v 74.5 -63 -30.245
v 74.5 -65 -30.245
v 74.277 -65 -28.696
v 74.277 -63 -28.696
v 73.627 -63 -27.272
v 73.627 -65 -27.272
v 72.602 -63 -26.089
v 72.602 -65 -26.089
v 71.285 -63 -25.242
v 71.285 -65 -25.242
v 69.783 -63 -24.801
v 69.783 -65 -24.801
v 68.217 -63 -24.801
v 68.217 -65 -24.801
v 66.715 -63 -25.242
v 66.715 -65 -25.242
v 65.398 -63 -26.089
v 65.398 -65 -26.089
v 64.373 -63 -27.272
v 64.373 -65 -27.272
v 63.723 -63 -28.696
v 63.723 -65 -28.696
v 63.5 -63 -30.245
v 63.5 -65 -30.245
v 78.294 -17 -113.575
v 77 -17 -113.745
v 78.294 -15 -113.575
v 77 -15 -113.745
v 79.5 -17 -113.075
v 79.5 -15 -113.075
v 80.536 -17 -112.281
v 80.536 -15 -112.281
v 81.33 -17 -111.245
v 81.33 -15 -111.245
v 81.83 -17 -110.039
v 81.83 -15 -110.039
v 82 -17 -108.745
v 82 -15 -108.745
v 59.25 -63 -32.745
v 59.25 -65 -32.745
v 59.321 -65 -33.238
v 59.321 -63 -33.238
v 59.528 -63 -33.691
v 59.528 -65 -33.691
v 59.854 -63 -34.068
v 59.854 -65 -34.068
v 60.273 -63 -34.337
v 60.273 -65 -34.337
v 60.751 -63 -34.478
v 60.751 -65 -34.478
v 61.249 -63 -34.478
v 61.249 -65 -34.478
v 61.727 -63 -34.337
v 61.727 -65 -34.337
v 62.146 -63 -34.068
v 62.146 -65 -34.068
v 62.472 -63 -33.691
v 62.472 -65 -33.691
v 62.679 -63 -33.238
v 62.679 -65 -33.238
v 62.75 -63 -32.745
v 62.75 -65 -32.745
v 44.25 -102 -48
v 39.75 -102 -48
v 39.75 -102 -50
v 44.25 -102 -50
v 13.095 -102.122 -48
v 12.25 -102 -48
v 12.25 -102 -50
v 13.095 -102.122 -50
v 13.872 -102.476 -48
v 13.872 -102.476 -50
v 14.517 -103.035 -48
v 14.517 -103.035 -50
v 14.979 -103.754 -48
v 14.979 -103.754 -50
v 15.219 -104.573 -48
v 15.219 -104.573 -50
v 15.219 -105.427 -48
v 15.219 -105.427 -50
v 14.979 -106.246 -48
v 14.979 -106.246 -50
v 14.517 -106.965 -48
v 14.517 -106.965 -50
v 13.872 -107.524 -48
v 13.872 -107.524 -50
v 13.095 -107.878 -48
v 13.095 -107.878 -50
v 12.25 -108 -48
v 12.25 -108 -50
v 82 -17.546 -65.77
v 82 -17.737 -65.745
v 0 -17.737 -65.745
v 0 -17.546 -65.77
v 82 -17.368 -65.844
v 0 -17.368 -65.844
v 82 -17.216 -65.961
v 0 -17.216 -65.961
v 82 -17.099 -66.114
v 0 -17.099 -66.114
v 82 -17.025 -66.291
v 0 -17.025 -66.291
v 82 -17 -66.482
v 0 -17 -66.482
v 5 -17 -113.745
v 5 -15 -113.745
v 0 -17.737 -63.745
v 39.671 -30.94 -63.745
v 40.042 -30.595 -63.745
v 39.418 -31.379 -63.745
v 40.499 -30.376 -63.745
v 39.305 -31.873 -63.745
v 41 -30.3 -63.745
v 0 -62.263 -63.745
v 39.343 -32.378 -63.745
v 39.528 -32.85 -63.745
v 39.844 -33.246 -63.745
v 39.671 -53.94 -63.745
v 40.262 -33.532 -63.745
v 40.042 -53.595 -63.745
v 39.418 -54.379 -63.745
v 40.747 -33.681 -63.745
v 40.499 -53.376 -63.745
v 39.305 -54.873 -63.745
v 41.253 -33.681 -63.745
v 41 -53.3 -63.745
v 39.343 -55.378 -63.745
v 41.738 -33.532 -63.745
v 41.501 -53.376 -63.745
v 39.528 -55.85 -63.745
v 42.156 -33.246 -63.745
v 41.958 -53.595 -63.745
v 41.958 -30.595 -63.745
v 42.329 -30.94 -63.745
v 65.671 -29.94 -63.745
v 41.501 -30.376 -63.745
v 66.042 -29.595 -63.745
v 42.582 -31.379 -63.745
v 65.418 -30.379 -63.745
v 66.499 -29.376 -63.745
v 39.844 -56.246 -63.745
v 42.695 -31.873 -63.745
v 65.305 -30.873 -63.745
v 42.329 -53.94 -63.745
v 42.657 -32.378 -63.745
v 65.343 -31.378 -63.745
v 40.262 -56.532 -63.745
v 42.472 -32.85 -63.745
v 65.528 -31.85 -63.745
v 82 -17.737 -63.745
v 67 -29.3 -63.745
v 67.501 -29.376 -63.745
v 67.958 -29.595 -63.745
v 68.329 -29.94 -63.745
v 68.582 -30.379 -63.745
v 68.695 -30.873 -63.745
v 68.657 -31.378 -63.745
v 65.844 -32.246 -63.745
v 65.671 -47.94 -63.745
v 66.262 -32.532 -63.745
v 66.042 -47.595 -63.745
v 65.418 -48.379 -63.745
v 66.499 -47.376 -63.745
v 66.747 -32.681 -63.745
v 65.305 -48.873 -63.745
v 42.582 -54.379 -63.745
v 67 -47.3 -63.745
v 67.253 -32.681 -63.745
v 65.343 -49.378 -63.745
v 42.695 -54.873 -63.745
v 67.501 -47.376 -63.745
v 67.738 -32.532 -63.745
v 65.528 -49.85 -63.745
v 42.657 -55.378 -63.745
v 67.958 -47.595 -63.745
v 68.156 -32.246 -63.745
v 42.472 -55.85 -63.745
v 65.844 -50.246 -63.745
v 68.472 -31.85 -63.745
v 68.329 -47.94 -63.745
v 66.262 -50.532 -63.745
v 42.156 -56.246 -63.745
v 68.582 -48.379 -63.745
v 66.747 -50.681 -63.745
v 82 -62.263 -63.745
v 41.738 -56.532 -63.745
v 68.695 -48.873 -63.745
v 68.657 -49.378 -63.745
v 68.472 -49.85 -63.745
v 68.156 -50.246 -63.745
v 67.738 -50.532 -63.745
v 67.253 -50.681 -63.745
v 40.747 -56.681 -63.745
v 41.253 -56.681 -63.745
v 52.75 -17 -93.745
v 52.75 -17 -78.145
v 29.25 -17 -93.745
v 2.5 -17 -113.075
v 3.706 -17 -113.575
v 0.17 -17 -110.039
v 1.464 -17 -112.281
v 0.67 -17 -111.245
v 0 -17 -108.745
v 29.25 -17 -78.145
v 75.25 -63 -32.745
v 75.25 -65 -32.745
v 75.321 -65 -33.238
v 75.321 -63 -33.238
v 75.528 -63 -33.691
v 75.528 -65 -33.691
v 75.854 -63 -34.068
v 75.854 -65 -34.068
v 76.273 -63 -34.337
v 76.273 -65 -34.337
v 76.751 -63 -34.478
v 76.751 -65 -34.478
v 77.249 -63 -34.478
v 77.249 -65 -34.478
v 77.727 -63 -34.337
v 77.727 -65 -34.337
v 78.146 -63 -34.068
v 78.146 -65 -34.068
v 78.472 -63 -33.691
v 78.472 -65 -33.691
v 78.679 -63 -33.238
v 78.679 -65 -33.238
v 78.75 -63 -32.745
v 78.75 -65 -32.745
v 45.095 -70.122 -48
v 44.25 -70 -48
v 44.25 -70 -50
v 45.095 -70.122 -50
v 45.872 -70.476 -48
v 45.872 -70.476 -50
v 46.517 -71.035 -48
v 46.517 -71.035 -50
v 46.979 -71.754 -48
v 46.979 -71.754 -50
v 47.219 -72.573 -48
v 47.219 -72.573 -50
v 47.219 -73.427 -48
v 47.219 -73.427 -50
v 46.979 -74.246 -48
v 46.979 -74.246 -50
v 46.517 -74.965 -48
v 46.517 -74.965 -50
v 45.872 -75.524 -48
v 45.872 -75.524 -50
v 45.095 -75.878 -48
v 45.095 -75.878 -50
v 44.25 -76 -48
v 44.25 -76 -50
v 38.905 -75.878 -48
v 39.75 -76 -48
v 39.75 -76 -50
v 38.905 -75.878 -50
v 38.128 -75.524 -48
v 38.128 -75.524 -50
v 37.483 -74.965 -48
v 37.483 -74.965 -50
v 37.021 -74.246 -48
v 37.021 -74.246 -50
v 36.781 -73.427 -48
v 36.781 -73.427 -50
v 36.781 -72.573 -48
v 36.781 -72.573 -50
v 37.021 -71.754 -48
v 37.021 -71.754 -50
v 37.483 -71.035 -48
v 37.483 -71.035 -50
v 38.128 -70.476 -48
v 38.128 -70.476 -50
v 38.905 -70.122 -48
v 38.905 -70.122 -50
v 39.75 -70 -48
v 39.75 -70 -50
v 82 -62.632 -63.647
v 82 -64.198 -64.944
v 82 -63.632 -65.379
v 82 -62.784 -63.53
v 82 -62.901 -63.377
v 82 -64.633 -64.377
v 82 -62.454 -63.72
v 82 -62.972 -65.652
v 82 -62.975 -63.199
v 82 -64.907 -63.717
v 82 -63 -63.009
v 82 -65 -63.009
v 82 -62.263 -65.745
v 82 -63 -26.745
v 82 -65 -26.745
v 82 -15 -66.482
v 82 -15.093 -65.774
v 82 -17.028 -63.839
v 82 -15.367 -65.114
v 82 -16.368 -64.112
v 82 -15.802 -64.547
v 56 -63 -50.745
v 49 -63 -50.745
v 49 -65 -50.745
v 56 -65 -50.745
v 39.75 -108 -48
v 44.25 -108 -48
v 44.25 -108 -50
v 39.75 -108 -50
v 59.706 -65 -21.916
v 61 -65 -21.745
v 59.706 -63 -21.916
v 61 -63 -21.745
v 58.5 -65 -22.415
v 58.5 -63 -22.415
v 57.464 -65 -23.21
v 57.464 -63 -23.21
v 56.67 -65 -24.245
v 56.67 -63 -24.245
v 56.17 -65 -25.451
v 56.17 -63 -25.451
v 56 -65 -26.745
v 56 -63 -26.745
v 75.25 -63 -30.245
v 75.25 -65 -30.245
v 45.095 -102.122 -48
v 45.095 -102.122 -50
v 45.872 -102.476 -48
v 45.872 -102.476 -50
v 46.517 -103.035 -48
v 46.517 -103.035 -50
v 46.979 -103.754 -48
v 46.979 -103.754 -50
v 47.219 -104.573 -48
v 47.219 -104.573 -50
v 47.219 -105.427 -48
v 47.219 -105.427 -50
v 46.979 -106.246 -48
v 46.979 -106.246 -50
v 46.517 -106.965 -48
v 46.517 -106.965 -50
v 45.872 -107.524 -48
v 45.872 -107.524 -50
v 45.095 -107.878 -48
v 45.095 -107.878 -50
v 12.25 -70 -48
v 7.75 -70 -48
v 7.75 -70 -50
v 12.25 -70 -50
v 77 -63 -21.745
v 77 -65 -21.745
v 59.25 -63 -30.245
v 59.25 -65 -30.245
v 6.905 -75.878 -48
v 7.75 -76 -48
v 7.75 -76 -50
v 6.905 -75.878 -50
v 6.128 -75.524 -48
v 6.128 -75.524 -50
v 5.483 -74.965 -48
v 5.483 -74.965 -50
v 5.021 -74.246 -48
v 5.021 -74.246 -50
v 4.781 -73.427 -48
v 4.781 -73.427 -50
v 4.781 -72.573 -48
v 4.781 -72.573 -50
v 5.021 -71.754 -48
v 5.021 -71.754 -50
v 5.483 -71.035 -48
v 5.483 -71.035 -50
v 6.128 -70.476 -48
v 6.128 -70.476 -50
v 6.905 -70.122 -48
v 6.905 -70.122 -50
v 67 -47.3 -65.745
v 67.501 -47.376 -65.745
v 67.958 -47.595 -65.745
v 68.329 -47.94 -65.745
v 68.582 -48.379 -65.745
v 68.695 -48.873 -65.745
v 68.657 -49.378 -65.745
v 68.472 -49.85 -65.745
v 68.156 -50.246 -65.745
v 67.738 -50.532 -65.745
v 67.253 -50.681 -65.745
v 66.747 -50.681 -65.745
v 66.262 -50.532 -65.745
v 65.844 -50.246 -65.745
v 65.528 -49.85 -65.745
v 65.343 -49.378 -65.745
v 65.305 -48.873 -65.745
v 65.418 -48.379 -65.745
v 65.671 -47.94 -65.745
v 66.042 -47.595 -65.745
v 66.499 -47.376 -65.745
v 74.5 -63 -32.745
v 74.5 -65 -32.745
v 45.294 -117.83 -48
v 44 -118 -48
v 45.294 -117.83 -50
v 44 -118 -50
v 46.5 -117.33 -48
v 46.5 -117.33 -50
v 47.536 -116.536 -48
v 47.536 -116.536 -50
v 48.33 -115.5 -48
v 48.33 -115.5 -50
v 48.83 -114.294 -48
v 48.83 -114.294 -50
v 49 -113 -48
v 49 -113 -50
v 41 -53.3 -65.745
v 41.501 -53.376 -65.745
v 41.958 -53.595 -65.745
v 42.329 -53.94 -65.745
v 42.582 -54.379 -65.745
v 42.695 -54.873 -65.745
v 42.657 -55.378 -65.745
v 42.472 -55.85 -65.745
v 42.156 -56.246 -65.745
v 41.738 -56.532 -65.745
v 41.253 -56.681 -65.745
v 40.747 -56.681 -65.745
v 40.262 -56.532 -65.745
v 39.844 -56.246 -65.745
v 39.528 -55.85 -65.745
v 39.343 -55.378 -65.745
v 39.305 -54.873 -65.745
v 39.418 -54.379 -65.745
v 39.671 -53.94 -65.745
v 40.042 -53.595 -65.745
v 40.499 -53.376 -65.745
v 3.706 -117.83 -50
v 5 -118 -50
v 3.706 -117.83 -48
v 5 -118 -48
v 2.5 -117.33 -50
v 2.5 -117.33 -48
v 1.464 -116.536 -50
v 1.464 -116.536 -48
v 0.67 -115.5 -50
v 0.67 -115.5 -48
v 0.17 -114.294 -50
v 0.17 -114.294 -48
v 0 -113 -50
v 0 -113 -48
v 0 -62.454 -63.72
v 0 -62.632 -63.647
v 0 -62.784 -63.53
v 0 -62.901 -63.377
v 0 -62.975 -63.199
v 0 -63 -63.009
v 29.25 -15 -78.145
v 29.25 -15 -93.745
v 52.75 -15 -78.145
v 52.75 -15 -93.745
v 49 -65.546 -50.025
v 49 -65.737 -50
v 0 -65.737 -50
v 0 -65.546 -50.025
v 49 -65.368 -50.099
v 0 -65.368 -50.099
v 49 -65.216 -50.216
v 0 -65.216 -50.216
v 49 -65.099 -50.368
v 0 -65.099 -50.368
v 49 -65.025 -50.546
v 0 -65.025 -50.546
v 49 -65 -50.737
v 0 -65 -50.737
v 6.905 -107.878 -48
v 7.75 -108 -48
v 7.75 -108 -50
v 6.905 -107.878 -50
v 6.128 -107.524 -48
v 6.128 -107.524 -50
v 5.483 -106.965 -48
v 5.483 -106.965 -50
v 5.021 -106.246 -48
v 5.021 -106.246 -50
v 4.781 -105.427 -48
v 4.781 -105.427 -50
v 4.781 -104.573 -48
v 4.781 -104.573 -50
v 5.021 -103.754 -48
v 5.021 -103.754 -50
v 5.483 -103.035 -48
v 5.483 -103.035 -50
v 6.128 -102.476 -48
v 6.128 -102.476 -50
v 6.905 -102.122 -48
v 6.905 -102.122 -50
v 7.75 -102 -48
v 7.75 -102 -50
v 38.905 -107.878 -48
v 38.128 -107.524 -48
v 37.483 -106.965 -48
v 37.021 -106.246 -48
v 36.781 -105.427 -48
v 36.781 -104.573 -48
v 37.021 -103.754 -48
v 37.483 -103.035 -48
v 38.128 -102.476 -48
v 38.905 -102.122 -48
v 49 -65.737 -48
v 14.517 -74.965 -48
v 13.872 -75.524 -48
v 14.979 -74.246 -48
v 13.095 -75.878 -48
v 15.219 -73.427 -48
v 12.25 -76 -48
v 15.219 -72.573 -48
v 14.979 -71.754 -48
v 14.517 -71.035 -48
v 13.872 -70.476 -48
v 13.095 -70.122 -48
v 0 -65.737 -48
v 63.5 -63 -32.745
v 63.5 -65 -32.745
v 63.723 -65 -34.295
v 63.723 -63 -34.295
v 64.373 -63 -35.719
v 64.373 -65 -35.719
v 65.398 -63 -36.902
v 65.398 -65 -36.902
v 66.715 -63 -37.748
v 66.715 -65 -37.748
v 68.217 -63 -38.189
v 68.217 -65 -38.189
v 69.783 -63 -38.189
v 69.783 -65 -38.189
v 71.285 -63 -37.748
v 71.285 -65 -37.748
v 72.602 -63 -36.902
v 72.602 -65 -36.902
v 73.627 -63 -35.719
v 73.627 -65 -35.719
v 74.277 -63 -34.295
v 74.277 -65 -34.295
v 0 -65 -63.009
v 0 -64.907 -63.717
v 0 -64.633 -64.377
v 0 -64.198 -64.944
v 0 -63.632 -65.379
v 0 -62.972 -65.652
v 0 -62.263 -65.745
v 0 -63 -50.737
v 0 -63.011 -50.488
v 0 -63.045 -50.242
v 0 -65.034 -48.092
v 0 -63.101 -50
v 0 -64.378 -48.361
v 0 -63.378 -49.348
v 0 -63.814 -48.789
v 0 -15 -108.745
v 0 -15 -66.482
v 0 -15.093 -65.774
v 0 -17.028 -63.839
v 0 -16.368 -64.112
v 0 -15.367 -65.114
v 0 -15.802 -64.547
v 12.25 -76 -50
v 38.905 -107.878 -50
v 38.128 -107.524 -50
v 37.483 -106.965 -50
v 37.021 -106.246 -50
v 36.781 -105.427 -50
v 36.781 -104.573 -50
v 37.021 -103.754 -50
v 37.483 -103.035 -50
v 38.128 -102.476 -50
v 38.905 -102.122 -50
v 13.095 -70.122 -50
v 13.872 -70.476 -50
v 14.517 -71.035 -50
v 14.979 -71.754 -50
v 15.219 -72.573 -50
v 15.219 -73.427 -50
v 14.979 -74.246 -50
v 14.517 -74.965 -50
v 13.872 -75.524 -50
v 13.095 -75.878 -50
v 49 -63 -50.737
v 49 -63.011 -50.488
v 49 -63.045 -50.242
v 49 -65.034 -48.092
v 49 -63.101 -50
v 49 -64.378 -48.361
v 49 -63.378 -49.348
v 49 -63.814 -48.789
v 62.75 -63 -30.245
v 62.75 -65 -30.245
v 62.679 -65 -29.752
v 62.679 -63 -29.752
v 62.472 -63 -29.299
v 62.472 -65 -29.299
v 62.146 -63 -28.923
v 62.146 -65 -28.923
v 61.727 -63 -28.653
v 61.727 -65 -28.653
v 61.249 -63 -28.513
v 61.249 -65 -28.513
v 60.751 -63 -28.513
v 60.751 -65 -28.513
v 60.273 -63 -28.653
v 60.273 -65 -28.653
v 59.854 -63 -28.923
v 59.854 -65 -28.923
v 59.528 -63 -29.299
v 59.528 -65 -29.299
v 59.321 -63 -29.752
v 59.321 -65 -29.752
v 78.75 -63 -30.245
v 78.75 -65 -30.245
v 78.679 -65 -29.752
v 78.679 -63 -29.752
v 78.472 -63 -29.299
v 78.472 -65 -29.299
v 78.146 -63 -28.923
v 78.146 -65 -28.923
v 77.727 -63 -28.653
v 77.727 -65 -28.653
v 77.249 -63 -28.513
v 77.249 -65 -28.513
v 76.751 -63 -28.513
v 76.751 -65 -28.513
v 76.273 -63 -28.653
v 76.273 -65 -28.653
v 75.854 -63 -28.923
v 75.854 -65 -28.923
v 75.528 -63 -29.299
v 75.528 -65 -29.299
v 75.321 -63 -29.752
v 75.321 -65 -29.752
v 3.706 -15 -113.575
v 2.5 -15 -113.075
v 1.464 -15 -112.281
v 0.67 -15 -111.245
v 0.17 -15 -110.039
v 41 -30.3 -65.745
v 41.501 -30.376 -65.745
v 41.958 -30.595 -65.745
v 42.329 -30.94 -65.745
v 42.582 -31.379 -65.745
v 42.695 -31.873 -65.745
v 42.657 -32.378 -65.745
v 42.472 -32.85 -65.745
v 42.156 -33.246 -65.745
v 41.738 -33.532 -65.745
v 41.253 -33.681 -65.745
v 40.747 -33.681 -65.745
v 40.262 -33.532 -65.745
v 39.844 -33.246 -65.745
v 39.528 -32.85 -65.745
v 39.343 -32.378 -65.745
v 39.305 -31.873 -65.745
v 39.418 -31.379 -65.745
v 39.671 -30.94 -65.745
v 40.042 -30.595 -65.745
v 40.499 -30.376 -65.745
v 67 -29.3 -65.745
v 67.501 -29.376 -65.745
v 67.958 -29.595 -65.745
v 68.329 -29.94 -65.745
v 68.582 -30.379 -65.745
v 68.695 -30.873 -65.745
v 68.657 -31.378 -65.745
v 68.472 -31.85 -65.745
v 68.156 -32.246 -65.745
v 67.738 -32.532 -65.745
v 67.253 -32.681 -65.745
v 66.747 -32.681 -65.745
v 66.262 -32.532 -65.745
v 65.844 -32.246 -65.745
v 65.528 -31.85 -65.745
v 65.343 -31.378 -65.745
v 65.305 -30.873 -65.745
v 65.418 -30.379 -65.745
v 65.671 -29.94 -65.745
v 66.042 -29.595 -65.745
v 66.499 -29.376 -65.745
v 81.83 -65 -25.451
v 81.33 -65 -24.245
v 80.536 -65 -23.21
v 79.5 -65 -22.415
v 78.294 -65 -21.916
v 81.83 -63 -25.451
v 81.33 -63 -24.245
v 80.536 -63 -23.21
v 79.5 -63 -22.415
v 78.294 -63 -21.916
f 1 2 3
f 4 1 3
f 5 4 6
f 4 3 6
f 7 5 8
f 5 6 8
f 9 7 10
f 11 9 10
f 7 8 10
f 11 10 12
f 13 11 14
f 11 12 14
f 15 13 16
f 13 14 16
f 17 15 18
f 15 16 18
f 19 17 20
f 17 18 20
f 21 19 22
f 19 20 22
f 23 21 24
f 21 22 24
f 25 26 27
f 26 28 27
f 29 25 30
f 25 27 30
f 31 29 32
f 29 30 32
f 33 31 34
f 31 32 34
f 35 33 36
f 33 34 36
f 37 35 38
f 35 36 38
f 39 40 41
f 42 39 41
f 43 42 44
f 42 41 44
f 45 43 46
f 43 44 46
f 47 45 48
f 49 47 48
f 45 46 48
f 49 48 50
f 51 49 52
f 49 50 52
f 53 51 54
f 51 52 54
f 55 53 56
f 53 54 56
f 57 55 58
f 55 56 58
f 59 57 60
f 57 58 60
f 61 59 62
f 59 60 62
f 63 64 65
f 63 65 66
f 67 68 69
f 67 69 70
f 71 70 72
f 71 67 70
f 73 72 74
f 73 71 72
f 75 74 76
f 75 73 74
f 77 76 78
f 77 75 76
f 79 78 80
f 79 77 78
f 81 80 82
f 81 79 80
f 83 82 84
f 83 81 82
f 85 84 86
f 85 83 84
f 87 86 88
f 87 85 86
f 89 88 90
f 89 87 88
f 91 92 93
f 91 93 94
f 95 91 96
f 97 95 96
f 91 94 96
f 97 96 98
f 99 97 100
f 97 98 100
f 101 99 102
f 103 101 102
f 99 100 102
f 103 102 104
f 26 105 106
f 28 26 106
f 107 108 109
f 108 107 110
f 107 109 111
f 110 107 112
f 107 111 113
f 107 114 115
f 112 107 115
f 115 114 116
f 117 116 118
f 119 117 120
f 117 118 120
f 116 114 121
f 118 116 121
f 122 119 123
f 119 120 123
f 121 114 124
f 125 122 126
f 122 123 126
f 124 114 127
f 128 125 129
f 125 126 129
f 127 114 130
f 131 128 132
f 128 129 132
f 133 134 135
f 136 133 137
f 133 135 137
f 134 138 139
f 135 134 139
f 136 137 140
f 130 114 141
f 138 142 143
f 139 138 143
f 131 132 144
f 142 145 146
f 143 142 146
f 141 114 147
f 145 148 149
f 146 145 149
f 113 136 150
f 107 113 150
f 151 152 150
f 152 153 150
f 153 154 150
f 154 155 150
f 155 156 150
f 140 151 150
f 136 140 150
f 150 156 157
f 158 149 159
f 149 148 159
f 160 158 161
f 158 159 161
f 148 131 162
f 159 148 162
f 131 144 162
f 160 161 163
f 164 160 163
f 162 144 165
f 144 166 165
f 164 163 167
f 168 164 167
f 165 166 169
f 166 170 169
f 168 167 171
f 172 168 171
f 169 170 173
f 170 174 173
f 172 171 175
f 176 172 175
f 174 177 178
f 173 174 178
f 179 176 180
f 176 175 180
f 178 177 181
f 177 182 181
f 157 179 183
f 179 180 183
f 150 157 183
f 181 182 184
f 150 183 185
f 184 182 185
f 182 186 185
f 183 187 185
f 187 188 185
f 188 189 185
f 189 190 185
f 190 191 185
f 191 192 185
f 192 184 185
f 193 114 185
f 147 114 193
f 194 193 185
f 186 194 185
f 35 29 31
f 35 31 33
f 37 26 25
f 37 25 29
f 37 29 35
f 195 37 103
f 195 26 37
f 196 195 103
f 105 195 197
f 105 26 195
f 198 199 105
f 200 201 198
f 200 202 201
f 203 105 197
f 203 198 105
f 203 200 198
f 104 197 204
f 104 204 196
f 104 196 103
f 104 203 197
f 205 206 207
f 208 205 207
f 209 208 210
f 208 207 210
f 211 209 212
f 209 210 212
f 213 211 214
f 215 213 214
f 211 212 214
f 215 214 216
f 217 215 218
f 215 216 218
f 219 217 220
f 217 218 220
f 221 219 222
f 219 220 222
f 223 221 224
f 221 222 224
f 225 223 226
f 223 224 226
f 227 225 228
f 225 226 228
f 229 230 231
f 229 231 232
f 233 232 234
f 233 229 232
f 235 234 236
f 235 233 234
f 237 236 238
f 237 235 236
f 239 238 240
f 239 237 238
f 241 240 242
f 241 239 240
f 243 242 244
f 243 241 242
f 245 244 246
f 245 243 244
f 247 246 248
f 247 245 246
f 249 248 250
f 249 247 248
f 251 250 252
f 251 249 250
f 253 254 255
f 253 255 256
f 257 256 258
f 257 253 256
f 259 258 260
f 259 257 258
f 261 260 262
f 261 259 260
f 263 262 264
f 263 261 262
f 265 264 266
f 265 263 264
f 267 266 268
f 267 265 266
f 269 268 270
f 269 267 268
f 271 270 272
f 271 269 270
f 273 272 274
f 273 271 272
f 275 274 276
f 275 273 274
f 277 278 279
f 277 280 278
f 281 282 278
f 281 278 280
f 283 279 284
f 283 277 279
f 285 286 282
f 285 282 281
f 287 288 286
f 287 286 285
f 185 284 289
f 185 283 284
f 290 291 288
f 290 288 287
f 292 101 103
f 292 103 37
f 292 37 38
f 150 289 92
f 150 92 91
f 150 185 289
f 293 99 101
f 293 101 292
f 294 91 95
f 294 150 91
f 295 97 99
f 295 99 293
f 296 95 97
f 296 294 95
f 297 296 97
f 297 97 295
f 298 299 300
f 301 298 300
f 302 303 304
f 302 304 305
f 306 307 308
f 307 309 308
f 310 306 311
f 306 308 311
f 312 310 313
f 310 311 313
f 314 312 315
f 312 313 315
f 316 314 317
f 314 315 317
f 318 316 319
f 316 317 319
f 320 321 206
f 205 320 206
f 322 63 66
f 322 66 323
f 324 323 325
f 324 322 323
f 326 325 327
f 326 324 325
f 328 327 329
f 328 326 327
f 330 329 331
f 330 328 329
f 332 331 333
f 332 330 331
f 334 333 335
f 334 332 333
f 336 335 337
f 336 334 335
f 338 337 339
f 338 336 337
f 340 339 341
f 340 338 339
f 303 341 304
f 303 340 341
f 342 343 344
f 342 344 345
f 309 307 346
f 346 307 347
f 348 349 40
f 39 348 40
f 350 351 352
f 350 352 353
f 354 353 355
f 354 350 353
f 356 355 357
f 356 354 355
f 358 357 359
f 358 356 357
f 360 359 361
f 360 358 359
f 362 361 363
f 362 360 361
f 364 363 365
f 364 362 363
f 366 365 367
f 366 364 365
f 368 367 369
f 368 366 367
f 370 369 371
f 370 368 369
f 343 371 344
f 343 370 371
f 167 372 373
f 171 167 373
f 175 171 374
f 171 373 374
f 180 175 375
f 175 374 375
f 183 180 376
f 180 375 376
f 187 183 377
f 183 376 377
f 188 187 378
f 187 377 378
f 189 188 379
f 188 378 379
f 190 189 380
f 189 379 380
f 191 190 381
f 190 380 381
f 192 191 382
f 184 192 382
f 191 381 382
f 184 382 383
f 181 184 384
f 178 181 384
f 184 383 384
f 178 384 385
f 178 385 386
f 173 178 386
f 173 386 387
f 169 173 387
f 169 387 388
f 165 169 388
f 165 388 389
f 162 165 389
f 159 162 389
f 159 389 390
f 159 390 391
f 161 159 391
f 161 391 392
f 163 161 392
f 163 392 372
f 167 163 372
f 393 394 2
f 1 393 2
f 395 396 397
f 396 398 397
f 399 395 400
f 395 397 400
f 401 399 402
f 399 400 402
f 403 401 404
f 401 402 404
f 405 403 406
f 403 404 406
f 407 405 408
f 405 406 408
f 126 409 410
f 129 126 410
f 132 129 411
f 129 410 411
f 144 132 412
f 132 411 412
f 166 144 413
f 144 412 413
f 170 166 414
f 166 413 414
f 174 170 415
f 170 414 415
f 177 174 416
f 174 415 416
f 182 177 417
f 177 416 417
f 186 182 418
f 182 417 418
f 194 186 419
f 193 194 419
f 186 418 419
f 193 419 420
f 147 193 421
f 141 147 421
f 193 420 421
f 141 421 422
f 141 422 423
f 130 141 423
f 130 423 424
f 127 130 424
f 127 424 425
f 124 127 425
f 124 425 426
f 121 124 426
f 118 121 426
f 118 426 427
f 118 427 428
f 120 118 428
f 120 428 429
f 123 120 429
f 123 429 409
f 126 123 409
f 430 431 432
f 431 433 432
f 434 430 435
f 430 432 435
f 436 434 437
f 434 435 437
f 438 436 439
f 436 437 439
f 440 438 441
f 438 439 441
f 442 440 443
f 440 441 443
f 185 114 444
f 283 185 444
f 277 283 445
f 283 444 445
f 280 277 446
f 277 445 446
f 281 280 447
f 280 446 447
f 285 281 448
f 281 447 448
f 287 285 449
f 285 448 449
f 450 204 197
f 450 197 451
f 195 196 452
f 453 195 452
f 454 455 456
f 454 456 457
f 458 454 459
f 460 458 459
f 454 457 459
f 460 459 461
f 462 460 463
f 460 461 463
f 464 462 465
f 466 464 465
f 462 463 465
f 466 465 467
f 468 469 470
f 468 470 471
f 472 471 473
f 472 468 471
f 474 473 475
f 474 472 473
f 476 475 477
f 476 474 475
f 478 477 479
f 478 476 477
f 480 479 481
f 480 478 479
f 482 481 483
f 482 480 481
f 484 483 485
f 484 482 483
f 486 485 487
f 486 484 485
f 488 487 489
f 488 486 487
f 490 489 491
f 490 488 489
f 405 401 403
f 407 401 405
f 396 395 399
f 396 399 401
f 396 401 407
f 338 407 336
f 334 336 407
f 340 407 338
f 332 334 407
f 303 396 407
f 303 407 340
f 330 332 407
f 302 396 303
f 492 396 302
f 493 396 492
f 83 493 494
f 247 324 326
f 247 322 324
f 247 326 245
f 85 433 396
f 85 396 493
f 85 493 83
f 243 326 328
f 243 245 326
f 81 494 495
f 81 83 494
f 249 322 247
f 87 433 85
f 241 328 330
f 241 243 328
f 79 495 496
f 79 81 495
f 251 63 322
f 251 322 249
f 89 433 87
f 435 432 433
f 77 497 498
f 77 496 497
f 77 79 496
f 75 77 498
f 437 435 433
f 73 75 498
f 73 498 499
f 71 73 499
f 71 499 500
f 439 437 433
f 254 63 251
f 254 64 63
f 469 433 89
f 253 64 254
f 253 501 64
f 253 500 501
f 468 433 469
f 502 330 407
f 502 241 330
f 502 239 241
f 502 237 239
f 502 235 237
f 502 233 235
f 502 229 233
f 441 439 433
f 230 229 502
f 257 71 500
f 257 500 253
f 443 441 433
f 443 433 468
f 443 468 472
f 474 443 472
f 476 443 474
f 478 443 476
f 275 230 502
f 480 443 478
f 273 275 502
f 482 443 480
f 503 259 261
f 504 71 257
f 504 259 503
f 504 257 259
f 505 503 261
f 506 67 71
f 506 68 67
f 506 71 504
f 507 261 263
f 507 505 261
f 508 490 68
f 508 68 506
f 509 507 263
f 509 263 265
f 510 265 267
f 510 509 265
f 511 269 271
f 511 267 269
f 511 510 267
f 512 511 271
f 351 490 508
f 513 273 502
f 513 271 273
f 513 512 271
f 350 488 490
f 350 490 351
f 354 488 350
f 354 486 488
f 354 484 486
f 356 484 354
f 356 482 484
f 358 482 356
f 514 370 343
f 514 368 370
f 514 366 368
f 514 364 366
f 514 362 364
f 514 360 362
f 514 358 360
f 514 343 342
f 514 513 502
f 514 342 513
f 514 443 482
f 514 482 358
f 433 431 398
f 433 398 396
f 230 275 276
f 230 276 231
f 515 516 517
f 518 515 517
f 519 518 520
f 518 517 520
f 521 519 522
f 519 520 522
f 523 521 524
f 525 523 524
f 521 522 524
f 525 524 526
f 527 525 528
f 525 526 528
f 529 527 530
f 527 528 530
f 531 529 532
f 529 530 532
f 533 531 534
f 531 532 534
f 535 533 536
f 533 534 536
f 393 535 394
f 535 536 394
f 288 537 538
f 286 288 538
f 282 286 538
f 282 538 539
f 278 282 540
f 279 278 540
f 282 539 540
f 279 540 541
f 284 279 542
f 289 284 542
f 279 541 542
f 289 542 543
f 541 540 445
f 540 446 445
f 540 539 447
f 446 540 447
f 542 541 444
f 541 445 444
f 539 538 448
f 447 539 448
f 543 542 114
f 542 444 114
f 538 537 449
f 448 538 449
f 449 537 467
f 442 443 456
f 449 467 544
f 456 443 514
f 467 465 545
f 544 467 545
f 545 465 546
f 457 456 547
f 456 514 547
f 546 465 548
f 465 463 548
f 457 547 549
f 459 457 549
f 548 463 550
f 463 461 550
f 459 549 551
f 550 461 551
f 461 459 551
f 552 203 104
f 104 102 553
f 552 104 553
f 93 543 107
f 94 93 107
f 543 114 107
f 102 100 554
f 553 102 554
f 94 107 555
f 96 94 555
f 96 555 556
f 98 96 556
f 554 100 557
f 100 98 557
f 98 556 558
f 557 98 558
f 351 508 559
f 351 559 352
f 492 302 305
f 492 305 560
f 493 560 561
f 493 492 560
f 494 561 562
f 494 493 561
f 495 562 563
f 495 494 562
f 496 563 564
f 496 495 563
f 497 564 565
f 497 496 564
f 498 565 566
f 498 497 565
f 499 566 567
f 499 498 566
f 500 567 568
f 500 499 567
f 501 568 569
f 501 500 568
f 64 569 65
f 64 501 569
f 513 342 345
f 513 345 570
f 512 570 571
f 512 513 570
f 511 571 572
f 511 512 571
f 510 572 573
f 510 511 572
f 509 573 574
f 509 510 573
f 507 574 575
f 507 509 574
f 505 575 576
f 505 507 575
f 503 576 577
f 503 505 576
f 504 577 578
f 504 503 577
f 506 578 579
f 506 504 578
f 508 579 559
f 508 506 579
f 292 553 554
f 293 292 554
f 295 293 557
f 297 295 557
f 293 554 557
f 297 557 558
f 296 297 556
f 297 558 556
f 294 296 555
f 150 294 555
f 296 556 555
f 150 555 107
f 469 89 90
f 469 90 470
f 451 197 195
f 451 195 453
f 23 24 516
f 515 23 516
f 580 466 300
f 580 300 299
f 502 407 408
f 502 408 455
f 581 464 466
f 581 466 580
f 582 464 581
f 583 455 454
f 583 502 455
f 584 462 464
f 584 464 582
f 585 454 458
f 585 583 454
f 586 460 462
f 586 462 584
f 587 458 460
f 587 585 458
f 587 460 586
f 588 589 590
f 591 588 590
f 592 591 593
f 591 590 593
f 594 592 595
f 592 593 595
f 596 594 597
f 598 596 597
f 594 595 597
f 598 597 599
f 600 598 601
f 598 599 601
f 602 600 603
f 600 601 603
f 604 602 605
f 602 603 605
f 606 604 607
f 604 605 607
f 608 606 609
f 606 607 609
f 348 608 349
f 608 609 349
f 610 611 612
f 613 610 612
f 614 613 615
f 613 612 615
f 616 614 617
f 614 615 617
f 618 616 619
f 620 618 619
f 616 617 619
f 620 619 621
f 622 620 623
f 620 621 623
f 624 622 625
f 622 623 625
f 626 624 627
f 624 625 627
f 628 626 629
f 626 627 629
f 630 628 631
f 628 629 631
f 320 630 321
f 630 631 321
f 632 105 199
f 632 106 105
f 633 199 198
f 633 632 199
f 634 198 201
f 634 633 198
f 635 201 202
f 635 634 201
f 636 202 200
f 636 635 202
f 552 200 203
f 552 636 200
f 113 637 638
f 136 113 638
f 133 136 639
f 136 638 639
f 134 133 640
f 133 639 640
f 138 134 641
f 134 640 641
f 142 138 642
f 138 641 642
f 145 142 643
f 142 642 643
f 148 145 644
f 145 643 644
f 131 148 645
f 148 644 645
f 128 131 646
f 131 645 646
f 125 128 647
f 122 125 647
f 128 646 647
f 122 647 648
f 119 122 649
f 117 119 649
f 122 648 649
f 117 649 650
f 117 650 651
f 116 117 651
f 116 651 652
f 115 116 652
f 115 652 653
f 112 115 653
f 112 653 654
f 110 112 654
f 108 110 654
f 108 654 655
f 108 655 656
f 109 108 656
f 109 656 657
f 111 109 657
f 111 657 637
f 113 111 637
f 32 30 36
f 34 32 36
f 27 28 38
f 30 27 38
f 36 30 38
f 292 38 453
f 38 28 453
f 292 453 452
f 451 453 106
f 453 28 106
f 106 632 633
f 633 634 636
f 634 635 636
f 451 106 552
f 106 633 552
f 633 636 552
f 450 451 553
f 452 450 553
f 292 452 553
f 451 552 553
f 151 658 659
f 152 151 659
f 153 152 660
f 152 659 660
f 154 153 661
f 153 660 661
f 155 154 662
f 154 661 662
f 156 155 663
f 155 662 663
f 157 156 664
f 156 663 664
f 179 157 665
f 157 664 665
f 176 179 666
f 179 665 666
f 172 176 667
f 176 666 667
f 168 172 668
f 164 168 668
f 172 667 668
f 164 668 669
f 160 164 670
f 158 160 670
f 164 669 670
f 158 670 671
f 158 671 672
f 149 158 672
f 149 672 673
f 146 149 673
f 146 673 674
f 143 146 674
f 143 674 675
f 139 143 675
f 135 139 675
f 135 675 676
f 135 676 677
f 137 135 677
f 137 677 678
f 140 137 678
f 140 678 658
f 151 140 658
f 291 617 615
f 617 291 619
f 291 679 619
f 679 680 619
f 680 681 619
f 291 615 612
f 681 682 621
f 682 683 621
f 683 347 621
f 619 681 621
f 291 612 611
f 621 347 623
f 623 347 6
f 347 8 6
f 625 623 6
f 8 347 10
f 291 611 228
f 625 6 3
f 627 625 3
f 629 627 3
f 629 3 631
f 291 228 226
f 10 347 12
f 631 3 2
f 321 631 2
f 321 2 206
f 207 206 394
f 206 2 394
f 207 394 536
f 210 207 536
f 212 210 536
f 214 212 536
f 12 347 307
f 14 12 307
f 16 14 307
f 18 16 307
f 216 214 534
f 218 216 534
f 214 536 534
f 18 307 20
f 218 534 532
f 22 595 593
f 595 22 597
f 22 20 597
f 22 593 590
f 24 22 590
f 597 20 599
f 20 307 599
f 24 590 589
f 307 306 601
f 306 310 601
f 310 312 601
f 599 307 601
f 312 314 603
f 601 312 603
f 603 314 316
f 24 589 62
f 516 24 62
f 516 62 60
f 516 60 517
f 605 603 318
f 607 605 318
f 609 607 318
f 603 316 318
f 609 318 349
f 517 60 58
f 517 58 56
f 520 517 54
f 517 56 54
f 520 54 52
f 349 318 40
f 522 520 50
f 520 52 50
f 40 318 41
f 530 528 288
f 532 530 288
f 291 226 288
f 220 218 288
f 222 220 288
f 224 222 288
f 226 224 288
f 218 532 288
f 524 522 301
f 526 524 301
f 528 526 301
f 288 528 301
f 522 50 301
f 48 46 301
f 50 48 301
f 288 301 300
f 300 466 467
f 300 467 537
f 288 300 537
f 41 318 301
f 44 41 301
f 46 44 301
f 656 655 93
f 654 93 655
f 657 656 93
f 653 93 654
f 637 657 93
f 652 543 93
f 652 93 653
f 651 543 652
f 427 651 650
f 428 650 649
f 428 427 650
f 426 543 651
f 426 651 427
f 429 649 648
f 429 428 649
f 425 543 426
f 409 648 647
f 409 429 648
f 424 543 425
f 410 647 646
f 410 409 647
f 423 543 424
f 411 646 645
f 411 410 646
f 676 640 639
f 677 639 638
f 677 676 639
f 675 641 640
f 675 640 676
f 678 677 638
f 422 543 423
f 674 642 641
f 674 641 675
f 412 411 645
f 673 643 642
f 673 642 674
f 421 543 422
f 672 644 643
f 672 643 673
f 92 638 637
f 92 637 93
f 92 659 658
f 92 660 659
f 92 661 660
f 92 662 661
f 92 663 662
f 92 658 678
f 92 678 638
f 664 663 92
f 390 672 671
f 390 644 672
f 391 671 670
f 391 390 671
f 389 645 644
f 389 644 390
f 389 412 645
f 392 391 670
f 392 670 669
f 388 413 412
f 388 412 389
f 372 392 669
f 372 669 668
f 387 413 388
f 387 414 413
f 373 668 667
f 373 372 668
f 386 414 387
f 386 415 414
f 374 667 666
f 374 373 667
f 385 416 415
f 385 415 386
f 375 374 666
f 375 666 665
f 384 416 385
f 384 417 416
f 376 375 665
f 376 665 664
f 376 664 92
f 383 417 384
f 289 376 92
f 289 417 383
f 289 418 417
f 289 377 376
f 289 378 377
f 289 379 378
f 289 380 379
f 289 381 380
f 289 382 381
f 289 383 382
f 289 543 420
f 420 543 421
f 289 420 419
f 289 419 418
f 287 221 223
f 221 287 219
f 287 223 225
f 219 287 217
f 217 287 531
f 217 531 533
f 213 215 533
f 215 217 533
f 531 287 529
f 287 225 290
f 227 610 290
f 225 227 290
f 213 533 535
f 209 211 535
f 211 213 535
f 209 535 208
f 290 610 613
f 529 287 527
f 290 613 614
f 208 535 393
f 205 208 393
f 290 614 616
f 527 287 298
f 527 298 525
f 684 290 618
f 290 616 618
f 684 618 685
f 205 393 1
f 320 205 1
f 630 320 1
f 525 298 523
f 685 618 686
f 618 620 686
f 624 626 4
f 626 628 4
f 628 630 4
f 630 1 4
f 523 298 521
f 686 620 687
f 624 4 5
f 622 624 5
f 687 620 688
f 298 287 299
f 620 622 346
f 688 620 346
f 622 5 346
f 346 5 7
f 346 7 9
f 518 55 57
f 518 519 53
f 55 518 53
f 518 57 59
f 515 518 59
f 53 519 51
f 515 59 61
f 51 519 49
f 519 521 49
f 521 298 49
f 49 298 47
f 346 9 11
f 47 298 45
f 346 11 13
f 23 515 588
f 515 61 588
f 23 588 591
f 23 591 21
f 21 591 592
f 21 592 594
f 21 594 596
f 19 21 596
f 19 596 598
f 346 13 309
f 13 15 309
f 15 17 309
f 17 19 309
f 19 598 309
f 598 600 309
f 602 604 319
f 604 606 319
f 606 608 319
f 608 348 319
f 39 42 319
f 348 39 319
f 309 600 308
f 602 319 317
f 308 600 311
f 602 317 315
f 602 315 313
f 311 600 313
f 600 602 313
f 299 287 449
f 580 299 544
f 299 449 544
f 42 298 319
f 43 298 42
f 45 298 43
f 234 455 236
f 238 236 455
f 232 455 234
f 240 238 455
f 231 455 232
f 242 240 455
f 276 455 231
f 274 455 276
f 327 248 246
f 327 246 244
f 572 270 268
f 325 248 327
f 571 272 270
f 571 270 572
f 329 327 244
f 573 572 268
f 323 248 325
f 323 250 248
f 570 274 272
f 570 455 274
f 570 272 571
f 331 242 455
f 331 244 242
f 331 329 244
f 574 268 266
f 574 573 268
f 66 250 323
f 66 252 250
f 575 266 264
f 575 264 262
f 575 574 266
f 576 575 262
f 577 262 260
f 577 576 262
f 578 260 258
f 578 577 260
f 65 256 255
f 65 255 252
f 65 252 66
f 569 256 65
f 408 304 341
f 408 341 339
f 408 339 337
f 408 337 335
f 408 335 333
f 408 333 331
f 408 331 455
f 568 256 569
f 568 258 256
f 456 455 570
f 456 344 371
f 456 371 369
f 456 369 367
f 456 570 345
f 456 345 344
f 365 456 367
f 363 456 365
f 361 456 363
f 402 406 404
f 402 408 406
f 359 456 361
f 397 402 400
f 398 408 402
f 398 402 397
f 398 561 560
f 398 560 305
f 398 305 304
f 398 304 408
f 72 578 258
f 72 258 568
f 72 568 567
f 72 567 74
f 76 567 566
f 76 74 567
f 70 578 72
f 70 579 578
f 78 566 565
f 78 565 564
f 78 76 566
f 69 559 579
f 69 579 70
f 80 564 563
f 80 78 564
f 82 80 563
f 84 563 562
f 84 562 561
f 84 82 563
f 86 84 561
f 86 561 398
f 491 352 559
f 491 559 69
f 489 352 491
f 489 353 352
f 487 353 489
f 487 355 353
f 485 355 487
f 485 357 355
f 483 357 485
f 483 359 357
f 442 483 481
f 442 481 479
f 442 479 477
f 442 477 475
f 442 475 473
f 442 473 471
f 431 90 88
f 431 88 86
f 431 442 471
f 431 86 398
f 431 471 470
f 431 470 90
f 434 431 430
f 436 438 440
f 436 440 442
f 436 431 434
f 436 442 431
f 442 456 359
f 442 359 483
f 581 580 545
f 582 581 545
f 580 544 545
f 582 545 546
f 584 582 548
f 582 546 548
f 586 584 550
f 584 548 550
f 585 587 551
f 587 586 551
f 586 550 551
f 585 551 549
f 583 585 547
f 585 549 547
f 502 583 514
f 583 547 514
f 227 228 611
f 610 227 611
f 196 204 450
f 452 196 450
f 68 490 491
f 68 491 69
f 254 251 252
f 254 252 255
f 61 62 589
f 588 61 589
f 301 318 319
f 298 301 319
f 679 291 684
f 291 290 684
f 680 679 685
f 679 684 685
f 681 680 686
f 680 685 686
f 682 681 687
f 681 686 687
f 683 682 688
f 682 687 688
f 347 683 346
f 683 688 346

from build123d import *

# Parameters (mm, degrees)
SKETCH1_W                    = 82
SKETCH1_H                    = 50
SKETCH1_W_2                  = 23.5
SKETCH1_H_2                  = 15.6
BASE_FLANGE1_DEPTH           = 2
EDGE_FLANGE1_STRIP_W         = 9.4732
EDGE_FLANGE1_STRIP_H         = 2
EDGE_FLANGE1_STRIP_CUT_DEPTH = 82
EDGE_FLANGE1_DEPTH           = 82
EDGE_FLANGE2_STRIP_W         = 9.4732
EDGE_FLANGE2_STRIP_H         = 2
EDGE_FLANGE2_STRIP_CUT_DEPTH = 82
EDGE_FLANGE2_DEPTH           = 82
CUT_EXTRUDE1_DEPTH           = 153.144667997
CUT_EXTRUDE1_DEPTH_BACK      = 153.144667997
SKETCHED_START               = -63
SKETCHED_BEND2_OUTLINE_W     = 82
SKETCHED_BEND2_OUTLINE_H     = 50
SKETCHED_BEND2_DEPTH         = 63
SKETCHED_START_2             = -92
SKETCHED_BEND2_2_OUTLINE_W   = 26
SKETCHED_BEND2_2_OUTLINE_H   = 2
SKETCHED_BEND2_2_DEPTH       = 27
SKETCHED_START_3             = -62.2634
SKETCHED_BEND2_3_OUTLINE_W   = 82
SKETCHED_BEND2_3_OUTLINE_H   = 2
SKETCHED_BEND2_3_DEPTH       = 44.5268
SKETCHED_START_4             = -65
SKETCHED_BEND2_4_OUTLINE_W   = 26
SKETCHED_BEND2_4_OUTLINE_H   = 26.254644901
SKETCHED_BEND2_4_DEPTH       = 2
SKETCHED_BEND2_5_DEPTH       = 49
SKETCHED_BEND2_6_OUTLINE_W   = 2
SKETCHED_BEND2_6_OUTLINE_H   = 20
SKETCHED_BEND2_6_DEPTH       = 82
SKETCHED_BEND2_7_OUTLINE_W   = 2
SKETCHED_BEND2_7_OUTLINE_H   = 15.6
SKETCHED_BEND2_7_DEPTH       = 29.25
SKETCHED_START_5             = 52.75
SKETCHED_BEND2_8_OUTLINE_W   = 2
SKETCHED_BEND2_8_OUTLINE_H   = 15.6
SKETCHED_BEND2_8_DEPTH       = 29.25
SKETCHED_START_6             = 56
SKETCHED_BEND2_9_OUTLINE_W   = 2
SKETCHED_BEND2_9_OUTLINE_H   = 0.745355099
SKETCHED_BEND2_9_DEPTH       = 26
SKETCHED_START_7             = 29.25
SKETCHED_BEND2_10_DEPTH      = 19.75
FILLET1_R                    = 5
SKETCH19_R                   = 1.7
CUT_EXTRUDE2_DEPTH           = 10


with BuildPart() as part:
    # Base-Flange1: sheet metal written as solids
    # Sketch1 → Base-Flange1 (new body)
    with BuildSketch(Plane.XY):
        with Locations((41, -25)):
            Rectangle(SKETCH1_W, SKETCH1_H)
        with Locations((41, -27.8)):
            Rectangle(SKETCH1_W_2, SKETCH1_H_2, mode=Mode.SUBTRACT)
    extrude(amount=-BASE_FLANGE1_DEPTH)

    # Edge-Flange1: sheet metal written as solids
    # Edge-Flange1 strip (on a plane across the edge) → Edge-Flange1 strip cut (cut)
    with BuildSketch(Plane(origin=(82, -50, -2), x_dir=(0, 1, 0), z_dir=(-1, 0, 0))):
        with Locations((-2, -1)):
            Rectangle(EDGE_FLANGE1_STRIP_W, EDGE_FLANGE1_STRIP_H)
    extrude(amount=EDGE_FLANGE1_STRIP_CUT_DEPTH, mode=Mode.SUBTRACT)

    # Edge-Flange1 section (on a plane across the edge) → Edge-Flange1 (add)
    with BuildSketch(Plane(origin=(82, -50, -2), x_dir=(0, 1, 0), z_dir=(-1, 0, 0))):
        with BuildLine():
            Line((0, 0.7366), (0, 46))
            Line((0, 46), (2, 46))
            Line((2, 46), (2, 0.7366))
            ThreePointArc((2, 0.7366), (2.215745145, 0.215745145), (2.7366, 0))
            Line((2.7366, 0), (2.7366, -2))
            ThreePointArc((2.7366, -2), (0.801531583, -1.198468417), (0, 0.7366))
        make_face()
    extrude(amount=EDGE_FLANGE1_DEPTH)

    # Edge-Flange2: sheet metal written as solids
    # Edge-Flange2 strip (on a plane across the edge) → Edge-Flange2 strip cut (cut)
    with BuildSketch(Plane(origin=(0, -50, -48), x_dir=(0, 0, 1), z_dir=(1, 0, 0))):
        with Locations((-4, -1)):
            Rectangle(EDGE_FLANGE2_STRIP_W, EDGE_FLANGE2_STRIP_H)
    extrude(amount=EDGE_FLANGE2_STRIP_CUT_DEPTH, mode=Mode.SUBTRACT)

    # Edge-Flange2 section (on a plane across the edge) → Edge-Flange2 (add)
    with BuildSketch(Plane(origin=(0, -50, -48), x_dir=(0, 0, 1), z_dir=(1, 0, 0))):
        with BuildLine():
            Line((-2, 0.7366), (-2, 68))
            Line((-2, 68), (0, 68))
            Line((0, 68), (0, 0.7366))
            ThreePointArc((0, 0.7366), (0.215745145, 0.215745145), (0.7366, 0))
            Line((0.7366, 0), (0.7366, -2))
            ThreePointArc((0.7366, -2), (-1.198468417, -1.198468417), (-2, 0.7366))
        make_face()
    extrude(amount=EDGE_FLANGE2_DEPTH)

    # Sketch12 → Cut-Extrude1 (cut, two sides: drawn at the far end of the back side and taken through both)
    with BuildSketch(Plane(origin=(0, 0, -50), x_dir=(-1, 0, 0), z_dir=(0, 0, -1)).offset(-CUT_EXTRUDE1_DEPTH_BACK)):
        Polygon((-56, -92), (-82, -92), (-82, -118), (-49, -118), (-49, -63), (-56, -63), align=None)
        with BuildLine():
            Line((-75.25, -83.5), (-75.25, -81))
            ThreePointArc((-75.25, -81), (-77, -79.25), (-78.75, -81))
            Line((-78.75, -81), (-78.75, -83.5))
            ThreePointArc((-78.75, -83.5), (-77, -85.25), (-75.25, -83.5))
        make_face()
        with BuildLine():
            Line((-63.5, -83.5), (-63.5, -81))
            ThreePointArc((-63.5, -81), (-69, -75.5), (-74.5, -81))
            Line((-74.5, -81), (-74.5, -83.5))
            ThreePointArc((-74.5, -83.5), (-69, -89), (-63.5, -83.5))
        make_face()
        with BuildLine():
            Line((-44.25, -76), (-39.75, -76))
            ThreePointArc((-39.75, -76), (-36.75, -73), (-39.75, -70))
            Line((-39.75, -70), (-44.25, -70))
            ThreePointArc((-44.25, -70), (-47.25, -73), (-44.25, -76))
        make_face()
        with BuildLine():
            Line((-12.25, -76), (-7.75, -76))
            ThreePointArc((-7.75, -76), (-4.75, -73), (-7.75, -70))
            Line((-7.75, -70), (-12.25, -70))
            ThreePointArc((-12.25, -70), (-15.25, -73), (-12.25, -76))
        make_face()
        with BuildLine():
            Line((-12.25, -108), (-7.75, -108))
            ThreePointArc((-7.75, -108), (-4.75, -105), (-7.75, -102))
            Line((-7.75, -102), (-12.25, -102))
            ThreePointArc((-12.25, -102), (-15.25, -105), (-12.25, -108))
        make_face()
        with BuildLine():
            Line((-44.25, -108), (-39.75, -108))
            ThreePointArc((-39.75, -108), (-36.75, -105), (-39.75, -102))
            Line((-39.75, -102), (-44.25, -102))
            ThreePointArc((-44.25, -102), (-47.25, -105), (-44.25, -108))
        make_face()
        with BuildLine():
            ThreePointArc((-59.25, -81), (-61, -79.25), (-62.75, -81))
            Line((-62.75, -81), (-62.75, -83.5))
            ThreePointArc((-62.75, -83.5), (-61, -85.25), (-59.25, -83.5))
            Line((-59.25, -83.5), (-59.25, -81))
        make_face()
    extrude(amount=CUT_EXTRUDE1_DEPTH + CUT_EXTRUDE1_DEPTH_BACK, mode=Mode.SUBTRACT)

    # Sketched Bend2: read off the stored shape, not the designer's step
    # Sketched Bend2 outline → Sketched Bend2 (cut)
    with BuildSketch(Plane(origin=(0, 0, 0), x_dir=(1, 0, 0), z_dir=(0, 1, 0)).offset(SKETCHED_START)):
        with Locations((41, 25)):
            Rectangle(SKETCHED_BEND2_OUTLINE_W, SKETCHED_BEND2_OUTLINE_H)
    extrude(amount=SKETCHED_BEND2_DEPTH, mode=Mode.SUBTRACT)

    # Sketched Bend2 2 outline → Sketched Bend2 2 (cut)
    with BuildSketch(Plane(origin=(0, 0, 0), x_dir=(1, 0, 0), z_dir=(0, 1, 0)).offset(SKETCHED_START_2)):
        with Locations((69, 49)):
            Rectangle(SKETCHED_BEND2_2_OUTLINE_W, SKETCHED_BEND2_2_OUTLINE_H)
    extrude(amount=SKETCHED_BEND2_2_DEPTH, mode=Mode.SUBTRACT)

    # Sketched Bend2 4 outline → Sketched Bend2 4 (add)
    with BuildSketch(Plane(origin=(0, 0, 0), x_dir=(1, 0, 0), z_dir=(0, 1, 0)).offset(SKETCHED_START_4)):
        with Locations((69, 34.872677549)):
            Rectangle(SKETCHED_BEND2_4_OUTLINE_W, SKETCHED_BEND2_4_OUTLINE_H)
        with BuildLine():
            Line((59.25, 30.245355099), (59.25, 32.745355099))
            ThreePointArc((59.25, 32.745355099), (61, 34.495355099), (62.75, 32.745355099))
            Line((62.75, 32.745355099), (62.75, 30.245355099))
            ThreePointArc((62.75, 30.245355099), (61, 28.495355099), (59.25, 30.245355099))
        make_face(mode=Mode.SUBTRACT)
        with BuildLine():
            Line((63.5, 30.245355099), (63.5, 32.745355099))
            ThreePointArc((63.5, 32.745355099), (69, 38.245355099), (74.5, 32.745355099))
            Line((74.5, 32.745355099), (74.5, 30.245355099))
            ThreePointArc((74.5, 30.245355099), (69, 24.745355099), (63.5, 30.245355099))
        make_face(mode=Mode.SUBTRACT)
        with BuildLine():
            Line((75.25, 30.245355099), (75.25, 32.745355099))
            ThreePointArc((75.25, 32.745355099), (77, 34.495355099), (78.75, 32.745355099))
            Line((78.75, 32.745355099), (78.75, 30.245355099))
            ThreePointArc((78.75, 30.245355099), (77, 28.495355099), (75.25, 30.245355099))
        make_face(mode=Mode.SUBTRACT)
    extrude(amount=SKETCHED_BEND2_4_DEPTH)

    # Sketched Bend2 5 outline → Sketched Bend2 5 (cut)
    with BuildSketch(Plane.YZ):
        with BuildLine():
            ThreePointArc((-65.7366, -48), (-64.082332791, -48.556604688), (-63.100997602, -50))
            Line((-63.100997602, -50), (-63, -50))
            Line((-63, -50), (-63, -48))
            Line((-63, -48), (-65.7366, -48))
        make_face()
    extrude(amount=SKETCHED_BEND2_5_DEPTH, mode=Mode.SUBTRACT)



with BuildPart() as body_2:
    # Sketched Bend2 3 outline → Sketched Bend2 3 (new body)
    with BuildSketch(Plane(origin=(0, 0, 0), x_dir=(1, 0, 0), z_dir=(0, 1, 0)).offset(SKETCHED_START_3)):
        with Locations((41, 64.745355099)):
            Rectangle(SKETCHED_BEND2_3_OUTLINE_W, SKETCHED_BEND2_3_OUTLINE_H)
    extrude(amount=SKETCHED_BEND2_3_DEPTH)

    # Sketched Bend2 6 outline → Sketched Bend2 6 (add)
    with BuildSketch(Plane.YZ):
        with BuildLine():
            Line((-65, -50.745355099), (-65, -63.008755099))
            ThreePointArc((-65, -63.008755099), (-64.198468417, -64.943823516), (-62.2634, -65.745355099))
            Line((-62.2634, -65.745355099), (-62.2634, -63.745355099))
            ThreePointArc((-62.2634, -63.745355099), (-62.784254855, -63.529609954), (-63, -63.008755099))
            Line((-63, -63.008755099), (-63, -50.745355099))
            Line((-63, -50.745355099), (-65, -50.745355099))
        make_face()
        with Locations((-16, -103.745355099)):
            Rectangle(SKETCHED_BEND2_6_OUTLINE_W, SKETCHED_BEND2_6_OUTLINE_H)
        with BuildLine():
            Line((-17, -66.481955099), (-17, -78.145355099))
            Line((-17, -78.145355099), (-15, -78.145355099))
            Line((-15, -78.145355099), (-15, -66.481955099))
            ThreePointArc((-15, -66.481955099), (-15.801531582, -64.546886681), (-17.7366, -63.745355099))
            Line((-17.7366, -63.745355099), (-17.7366, -65.745355099))
            ThreePointArc((-17.7366, -65.745355099), (-17.215745145, -65.961100244), (-17, -66.481955099))
        make_face()
    extrude(amount=SKETCHED_BEND2_6_DEPTH)


with BuildPart() as part_1:
    add(part.part)

    add(body_2.part)  # Sketched Bend2 7 merges body 2
    # Sketched Bend2 7 outline → Sketched Bend2 7 (add)
    with BuildSketch(Plane.YZ):
        with BuildLine():
            Line((-65, -50.7366), (-65, -50.745355099))
            Line((-65, -50.745355099), (-63, -50.745355099))
            Line((-63, -50.745355099), (-63, -50.7366))
            ThreePointArc((-63, -50.7366), (-63.025366971, -50.364854094), (-63.100997602, -50))
            Line((-63.100997602, -50), (-65.7366, -50))
            ThreePointArc((-65.7366, -50), (-65.215745145, -50.215745145), (-65, -50.7366))
        make_face()
        with Locations((-16, -85.945355099)):
            Rectangle(SKETCHED_BEND2_7_OUTLINE_W, SKETCHED_BEND2_7_OUTLINE_H)
    extrude(amount=SKETCHED_BEND2_7_DEPTH)

    # Sketched Bend2 8 outline → Sketched Bend2 8 (add)
    with BuildSketch(Plane.YZ.offset(SKETCHED_START_5)):
        with Locations((-16, -85.945355099)):
            Rectangle(SKETCHED_BEND2_8_OUTLINE_W, SKETCHED_BEND2_8_OUTLINE_H)
    extrude(amount=SKETCHED_BEND2_8_DEPTH)

    # Sketched Bend2 9 outline → Sketched Bend2 9 (add)
    with BuildSketch(Plane.YZ.offset(SKETCHED_START_6)):
        with Locations((-64, -50.372677549)):
            Rectangle(SKETCHED_BEND2_9_OUTLINE_W, SKETCHED_BEND2_9_OUTLINE_H)
    extrude(amount=SKETCHED_BEND2_9_DEPTH)

    # Sketched Bend2 10 outline → Sketched Bend2 10 (add)
    with BuildSketch(Plane.YZ.offset(SKETCHED_START_7)):
        with BuildLine():
            Line((-65, -50.7366), (-65, -50.745355099))
            Line((-65, -50.745355099), (-63, -50.745355099))
            Line((-63, -50.745355099), (-63, -50.7366))
            ThreePointArc((-63, -50.7366), (-63.025366971, -50.364854094), (-63.100997602, -50))
            Line((-63.100997602, -50), (-65.7366, -50))
            ThreePointArc((-65.7366, -50), (-65.215745145, -50.215745145), (-65, -50.7366))
        make_face()
    extrude(amount=SKETCHED_BEND2_10_DEPTH)

    # Fillet1
    fillet1_edges = [part_1.edges().sort_by_distance(p)[0] for p in [
        (82, -64, -21.745355099),
        (56, -64, -21.745355099),
        (49, -118, -49),
        (0, -118, -49),
        (0, -16, -113.745355099),
        (82, -16, -113.745355099),
    ]]
    fillet(fillet1_edges, radius=FILLET1_R)

    # Sketch19 → Cut-Extrude2 (cut)
    with BuildSketch(Plane(origin=(0, 0, -65.745355099), x_dir=(-1, 0, 0), z_dir=(0, 0, -1))):
        with Locations(Location((-41, -32, 0), (0, 0, 90))):
            Circle(SKETCH19_R)
        with Locations(Location((-41, -55, 0), (0, 0, 90))):
            Circle(SKETCH19_R)
        with Locations(Location((-67, -31, 0), (0, 0, 90))):
            Circle(SKETCH19_R)
        with Locations(Location((-67, -49, 0), (0, 0, 90))):
            Circle(SKETCH19_R)
    extrude(amount=-CUT_EXTRUDE2_DEPTH, mode=Mode.SUBTRACT)


solid = part_1.part
